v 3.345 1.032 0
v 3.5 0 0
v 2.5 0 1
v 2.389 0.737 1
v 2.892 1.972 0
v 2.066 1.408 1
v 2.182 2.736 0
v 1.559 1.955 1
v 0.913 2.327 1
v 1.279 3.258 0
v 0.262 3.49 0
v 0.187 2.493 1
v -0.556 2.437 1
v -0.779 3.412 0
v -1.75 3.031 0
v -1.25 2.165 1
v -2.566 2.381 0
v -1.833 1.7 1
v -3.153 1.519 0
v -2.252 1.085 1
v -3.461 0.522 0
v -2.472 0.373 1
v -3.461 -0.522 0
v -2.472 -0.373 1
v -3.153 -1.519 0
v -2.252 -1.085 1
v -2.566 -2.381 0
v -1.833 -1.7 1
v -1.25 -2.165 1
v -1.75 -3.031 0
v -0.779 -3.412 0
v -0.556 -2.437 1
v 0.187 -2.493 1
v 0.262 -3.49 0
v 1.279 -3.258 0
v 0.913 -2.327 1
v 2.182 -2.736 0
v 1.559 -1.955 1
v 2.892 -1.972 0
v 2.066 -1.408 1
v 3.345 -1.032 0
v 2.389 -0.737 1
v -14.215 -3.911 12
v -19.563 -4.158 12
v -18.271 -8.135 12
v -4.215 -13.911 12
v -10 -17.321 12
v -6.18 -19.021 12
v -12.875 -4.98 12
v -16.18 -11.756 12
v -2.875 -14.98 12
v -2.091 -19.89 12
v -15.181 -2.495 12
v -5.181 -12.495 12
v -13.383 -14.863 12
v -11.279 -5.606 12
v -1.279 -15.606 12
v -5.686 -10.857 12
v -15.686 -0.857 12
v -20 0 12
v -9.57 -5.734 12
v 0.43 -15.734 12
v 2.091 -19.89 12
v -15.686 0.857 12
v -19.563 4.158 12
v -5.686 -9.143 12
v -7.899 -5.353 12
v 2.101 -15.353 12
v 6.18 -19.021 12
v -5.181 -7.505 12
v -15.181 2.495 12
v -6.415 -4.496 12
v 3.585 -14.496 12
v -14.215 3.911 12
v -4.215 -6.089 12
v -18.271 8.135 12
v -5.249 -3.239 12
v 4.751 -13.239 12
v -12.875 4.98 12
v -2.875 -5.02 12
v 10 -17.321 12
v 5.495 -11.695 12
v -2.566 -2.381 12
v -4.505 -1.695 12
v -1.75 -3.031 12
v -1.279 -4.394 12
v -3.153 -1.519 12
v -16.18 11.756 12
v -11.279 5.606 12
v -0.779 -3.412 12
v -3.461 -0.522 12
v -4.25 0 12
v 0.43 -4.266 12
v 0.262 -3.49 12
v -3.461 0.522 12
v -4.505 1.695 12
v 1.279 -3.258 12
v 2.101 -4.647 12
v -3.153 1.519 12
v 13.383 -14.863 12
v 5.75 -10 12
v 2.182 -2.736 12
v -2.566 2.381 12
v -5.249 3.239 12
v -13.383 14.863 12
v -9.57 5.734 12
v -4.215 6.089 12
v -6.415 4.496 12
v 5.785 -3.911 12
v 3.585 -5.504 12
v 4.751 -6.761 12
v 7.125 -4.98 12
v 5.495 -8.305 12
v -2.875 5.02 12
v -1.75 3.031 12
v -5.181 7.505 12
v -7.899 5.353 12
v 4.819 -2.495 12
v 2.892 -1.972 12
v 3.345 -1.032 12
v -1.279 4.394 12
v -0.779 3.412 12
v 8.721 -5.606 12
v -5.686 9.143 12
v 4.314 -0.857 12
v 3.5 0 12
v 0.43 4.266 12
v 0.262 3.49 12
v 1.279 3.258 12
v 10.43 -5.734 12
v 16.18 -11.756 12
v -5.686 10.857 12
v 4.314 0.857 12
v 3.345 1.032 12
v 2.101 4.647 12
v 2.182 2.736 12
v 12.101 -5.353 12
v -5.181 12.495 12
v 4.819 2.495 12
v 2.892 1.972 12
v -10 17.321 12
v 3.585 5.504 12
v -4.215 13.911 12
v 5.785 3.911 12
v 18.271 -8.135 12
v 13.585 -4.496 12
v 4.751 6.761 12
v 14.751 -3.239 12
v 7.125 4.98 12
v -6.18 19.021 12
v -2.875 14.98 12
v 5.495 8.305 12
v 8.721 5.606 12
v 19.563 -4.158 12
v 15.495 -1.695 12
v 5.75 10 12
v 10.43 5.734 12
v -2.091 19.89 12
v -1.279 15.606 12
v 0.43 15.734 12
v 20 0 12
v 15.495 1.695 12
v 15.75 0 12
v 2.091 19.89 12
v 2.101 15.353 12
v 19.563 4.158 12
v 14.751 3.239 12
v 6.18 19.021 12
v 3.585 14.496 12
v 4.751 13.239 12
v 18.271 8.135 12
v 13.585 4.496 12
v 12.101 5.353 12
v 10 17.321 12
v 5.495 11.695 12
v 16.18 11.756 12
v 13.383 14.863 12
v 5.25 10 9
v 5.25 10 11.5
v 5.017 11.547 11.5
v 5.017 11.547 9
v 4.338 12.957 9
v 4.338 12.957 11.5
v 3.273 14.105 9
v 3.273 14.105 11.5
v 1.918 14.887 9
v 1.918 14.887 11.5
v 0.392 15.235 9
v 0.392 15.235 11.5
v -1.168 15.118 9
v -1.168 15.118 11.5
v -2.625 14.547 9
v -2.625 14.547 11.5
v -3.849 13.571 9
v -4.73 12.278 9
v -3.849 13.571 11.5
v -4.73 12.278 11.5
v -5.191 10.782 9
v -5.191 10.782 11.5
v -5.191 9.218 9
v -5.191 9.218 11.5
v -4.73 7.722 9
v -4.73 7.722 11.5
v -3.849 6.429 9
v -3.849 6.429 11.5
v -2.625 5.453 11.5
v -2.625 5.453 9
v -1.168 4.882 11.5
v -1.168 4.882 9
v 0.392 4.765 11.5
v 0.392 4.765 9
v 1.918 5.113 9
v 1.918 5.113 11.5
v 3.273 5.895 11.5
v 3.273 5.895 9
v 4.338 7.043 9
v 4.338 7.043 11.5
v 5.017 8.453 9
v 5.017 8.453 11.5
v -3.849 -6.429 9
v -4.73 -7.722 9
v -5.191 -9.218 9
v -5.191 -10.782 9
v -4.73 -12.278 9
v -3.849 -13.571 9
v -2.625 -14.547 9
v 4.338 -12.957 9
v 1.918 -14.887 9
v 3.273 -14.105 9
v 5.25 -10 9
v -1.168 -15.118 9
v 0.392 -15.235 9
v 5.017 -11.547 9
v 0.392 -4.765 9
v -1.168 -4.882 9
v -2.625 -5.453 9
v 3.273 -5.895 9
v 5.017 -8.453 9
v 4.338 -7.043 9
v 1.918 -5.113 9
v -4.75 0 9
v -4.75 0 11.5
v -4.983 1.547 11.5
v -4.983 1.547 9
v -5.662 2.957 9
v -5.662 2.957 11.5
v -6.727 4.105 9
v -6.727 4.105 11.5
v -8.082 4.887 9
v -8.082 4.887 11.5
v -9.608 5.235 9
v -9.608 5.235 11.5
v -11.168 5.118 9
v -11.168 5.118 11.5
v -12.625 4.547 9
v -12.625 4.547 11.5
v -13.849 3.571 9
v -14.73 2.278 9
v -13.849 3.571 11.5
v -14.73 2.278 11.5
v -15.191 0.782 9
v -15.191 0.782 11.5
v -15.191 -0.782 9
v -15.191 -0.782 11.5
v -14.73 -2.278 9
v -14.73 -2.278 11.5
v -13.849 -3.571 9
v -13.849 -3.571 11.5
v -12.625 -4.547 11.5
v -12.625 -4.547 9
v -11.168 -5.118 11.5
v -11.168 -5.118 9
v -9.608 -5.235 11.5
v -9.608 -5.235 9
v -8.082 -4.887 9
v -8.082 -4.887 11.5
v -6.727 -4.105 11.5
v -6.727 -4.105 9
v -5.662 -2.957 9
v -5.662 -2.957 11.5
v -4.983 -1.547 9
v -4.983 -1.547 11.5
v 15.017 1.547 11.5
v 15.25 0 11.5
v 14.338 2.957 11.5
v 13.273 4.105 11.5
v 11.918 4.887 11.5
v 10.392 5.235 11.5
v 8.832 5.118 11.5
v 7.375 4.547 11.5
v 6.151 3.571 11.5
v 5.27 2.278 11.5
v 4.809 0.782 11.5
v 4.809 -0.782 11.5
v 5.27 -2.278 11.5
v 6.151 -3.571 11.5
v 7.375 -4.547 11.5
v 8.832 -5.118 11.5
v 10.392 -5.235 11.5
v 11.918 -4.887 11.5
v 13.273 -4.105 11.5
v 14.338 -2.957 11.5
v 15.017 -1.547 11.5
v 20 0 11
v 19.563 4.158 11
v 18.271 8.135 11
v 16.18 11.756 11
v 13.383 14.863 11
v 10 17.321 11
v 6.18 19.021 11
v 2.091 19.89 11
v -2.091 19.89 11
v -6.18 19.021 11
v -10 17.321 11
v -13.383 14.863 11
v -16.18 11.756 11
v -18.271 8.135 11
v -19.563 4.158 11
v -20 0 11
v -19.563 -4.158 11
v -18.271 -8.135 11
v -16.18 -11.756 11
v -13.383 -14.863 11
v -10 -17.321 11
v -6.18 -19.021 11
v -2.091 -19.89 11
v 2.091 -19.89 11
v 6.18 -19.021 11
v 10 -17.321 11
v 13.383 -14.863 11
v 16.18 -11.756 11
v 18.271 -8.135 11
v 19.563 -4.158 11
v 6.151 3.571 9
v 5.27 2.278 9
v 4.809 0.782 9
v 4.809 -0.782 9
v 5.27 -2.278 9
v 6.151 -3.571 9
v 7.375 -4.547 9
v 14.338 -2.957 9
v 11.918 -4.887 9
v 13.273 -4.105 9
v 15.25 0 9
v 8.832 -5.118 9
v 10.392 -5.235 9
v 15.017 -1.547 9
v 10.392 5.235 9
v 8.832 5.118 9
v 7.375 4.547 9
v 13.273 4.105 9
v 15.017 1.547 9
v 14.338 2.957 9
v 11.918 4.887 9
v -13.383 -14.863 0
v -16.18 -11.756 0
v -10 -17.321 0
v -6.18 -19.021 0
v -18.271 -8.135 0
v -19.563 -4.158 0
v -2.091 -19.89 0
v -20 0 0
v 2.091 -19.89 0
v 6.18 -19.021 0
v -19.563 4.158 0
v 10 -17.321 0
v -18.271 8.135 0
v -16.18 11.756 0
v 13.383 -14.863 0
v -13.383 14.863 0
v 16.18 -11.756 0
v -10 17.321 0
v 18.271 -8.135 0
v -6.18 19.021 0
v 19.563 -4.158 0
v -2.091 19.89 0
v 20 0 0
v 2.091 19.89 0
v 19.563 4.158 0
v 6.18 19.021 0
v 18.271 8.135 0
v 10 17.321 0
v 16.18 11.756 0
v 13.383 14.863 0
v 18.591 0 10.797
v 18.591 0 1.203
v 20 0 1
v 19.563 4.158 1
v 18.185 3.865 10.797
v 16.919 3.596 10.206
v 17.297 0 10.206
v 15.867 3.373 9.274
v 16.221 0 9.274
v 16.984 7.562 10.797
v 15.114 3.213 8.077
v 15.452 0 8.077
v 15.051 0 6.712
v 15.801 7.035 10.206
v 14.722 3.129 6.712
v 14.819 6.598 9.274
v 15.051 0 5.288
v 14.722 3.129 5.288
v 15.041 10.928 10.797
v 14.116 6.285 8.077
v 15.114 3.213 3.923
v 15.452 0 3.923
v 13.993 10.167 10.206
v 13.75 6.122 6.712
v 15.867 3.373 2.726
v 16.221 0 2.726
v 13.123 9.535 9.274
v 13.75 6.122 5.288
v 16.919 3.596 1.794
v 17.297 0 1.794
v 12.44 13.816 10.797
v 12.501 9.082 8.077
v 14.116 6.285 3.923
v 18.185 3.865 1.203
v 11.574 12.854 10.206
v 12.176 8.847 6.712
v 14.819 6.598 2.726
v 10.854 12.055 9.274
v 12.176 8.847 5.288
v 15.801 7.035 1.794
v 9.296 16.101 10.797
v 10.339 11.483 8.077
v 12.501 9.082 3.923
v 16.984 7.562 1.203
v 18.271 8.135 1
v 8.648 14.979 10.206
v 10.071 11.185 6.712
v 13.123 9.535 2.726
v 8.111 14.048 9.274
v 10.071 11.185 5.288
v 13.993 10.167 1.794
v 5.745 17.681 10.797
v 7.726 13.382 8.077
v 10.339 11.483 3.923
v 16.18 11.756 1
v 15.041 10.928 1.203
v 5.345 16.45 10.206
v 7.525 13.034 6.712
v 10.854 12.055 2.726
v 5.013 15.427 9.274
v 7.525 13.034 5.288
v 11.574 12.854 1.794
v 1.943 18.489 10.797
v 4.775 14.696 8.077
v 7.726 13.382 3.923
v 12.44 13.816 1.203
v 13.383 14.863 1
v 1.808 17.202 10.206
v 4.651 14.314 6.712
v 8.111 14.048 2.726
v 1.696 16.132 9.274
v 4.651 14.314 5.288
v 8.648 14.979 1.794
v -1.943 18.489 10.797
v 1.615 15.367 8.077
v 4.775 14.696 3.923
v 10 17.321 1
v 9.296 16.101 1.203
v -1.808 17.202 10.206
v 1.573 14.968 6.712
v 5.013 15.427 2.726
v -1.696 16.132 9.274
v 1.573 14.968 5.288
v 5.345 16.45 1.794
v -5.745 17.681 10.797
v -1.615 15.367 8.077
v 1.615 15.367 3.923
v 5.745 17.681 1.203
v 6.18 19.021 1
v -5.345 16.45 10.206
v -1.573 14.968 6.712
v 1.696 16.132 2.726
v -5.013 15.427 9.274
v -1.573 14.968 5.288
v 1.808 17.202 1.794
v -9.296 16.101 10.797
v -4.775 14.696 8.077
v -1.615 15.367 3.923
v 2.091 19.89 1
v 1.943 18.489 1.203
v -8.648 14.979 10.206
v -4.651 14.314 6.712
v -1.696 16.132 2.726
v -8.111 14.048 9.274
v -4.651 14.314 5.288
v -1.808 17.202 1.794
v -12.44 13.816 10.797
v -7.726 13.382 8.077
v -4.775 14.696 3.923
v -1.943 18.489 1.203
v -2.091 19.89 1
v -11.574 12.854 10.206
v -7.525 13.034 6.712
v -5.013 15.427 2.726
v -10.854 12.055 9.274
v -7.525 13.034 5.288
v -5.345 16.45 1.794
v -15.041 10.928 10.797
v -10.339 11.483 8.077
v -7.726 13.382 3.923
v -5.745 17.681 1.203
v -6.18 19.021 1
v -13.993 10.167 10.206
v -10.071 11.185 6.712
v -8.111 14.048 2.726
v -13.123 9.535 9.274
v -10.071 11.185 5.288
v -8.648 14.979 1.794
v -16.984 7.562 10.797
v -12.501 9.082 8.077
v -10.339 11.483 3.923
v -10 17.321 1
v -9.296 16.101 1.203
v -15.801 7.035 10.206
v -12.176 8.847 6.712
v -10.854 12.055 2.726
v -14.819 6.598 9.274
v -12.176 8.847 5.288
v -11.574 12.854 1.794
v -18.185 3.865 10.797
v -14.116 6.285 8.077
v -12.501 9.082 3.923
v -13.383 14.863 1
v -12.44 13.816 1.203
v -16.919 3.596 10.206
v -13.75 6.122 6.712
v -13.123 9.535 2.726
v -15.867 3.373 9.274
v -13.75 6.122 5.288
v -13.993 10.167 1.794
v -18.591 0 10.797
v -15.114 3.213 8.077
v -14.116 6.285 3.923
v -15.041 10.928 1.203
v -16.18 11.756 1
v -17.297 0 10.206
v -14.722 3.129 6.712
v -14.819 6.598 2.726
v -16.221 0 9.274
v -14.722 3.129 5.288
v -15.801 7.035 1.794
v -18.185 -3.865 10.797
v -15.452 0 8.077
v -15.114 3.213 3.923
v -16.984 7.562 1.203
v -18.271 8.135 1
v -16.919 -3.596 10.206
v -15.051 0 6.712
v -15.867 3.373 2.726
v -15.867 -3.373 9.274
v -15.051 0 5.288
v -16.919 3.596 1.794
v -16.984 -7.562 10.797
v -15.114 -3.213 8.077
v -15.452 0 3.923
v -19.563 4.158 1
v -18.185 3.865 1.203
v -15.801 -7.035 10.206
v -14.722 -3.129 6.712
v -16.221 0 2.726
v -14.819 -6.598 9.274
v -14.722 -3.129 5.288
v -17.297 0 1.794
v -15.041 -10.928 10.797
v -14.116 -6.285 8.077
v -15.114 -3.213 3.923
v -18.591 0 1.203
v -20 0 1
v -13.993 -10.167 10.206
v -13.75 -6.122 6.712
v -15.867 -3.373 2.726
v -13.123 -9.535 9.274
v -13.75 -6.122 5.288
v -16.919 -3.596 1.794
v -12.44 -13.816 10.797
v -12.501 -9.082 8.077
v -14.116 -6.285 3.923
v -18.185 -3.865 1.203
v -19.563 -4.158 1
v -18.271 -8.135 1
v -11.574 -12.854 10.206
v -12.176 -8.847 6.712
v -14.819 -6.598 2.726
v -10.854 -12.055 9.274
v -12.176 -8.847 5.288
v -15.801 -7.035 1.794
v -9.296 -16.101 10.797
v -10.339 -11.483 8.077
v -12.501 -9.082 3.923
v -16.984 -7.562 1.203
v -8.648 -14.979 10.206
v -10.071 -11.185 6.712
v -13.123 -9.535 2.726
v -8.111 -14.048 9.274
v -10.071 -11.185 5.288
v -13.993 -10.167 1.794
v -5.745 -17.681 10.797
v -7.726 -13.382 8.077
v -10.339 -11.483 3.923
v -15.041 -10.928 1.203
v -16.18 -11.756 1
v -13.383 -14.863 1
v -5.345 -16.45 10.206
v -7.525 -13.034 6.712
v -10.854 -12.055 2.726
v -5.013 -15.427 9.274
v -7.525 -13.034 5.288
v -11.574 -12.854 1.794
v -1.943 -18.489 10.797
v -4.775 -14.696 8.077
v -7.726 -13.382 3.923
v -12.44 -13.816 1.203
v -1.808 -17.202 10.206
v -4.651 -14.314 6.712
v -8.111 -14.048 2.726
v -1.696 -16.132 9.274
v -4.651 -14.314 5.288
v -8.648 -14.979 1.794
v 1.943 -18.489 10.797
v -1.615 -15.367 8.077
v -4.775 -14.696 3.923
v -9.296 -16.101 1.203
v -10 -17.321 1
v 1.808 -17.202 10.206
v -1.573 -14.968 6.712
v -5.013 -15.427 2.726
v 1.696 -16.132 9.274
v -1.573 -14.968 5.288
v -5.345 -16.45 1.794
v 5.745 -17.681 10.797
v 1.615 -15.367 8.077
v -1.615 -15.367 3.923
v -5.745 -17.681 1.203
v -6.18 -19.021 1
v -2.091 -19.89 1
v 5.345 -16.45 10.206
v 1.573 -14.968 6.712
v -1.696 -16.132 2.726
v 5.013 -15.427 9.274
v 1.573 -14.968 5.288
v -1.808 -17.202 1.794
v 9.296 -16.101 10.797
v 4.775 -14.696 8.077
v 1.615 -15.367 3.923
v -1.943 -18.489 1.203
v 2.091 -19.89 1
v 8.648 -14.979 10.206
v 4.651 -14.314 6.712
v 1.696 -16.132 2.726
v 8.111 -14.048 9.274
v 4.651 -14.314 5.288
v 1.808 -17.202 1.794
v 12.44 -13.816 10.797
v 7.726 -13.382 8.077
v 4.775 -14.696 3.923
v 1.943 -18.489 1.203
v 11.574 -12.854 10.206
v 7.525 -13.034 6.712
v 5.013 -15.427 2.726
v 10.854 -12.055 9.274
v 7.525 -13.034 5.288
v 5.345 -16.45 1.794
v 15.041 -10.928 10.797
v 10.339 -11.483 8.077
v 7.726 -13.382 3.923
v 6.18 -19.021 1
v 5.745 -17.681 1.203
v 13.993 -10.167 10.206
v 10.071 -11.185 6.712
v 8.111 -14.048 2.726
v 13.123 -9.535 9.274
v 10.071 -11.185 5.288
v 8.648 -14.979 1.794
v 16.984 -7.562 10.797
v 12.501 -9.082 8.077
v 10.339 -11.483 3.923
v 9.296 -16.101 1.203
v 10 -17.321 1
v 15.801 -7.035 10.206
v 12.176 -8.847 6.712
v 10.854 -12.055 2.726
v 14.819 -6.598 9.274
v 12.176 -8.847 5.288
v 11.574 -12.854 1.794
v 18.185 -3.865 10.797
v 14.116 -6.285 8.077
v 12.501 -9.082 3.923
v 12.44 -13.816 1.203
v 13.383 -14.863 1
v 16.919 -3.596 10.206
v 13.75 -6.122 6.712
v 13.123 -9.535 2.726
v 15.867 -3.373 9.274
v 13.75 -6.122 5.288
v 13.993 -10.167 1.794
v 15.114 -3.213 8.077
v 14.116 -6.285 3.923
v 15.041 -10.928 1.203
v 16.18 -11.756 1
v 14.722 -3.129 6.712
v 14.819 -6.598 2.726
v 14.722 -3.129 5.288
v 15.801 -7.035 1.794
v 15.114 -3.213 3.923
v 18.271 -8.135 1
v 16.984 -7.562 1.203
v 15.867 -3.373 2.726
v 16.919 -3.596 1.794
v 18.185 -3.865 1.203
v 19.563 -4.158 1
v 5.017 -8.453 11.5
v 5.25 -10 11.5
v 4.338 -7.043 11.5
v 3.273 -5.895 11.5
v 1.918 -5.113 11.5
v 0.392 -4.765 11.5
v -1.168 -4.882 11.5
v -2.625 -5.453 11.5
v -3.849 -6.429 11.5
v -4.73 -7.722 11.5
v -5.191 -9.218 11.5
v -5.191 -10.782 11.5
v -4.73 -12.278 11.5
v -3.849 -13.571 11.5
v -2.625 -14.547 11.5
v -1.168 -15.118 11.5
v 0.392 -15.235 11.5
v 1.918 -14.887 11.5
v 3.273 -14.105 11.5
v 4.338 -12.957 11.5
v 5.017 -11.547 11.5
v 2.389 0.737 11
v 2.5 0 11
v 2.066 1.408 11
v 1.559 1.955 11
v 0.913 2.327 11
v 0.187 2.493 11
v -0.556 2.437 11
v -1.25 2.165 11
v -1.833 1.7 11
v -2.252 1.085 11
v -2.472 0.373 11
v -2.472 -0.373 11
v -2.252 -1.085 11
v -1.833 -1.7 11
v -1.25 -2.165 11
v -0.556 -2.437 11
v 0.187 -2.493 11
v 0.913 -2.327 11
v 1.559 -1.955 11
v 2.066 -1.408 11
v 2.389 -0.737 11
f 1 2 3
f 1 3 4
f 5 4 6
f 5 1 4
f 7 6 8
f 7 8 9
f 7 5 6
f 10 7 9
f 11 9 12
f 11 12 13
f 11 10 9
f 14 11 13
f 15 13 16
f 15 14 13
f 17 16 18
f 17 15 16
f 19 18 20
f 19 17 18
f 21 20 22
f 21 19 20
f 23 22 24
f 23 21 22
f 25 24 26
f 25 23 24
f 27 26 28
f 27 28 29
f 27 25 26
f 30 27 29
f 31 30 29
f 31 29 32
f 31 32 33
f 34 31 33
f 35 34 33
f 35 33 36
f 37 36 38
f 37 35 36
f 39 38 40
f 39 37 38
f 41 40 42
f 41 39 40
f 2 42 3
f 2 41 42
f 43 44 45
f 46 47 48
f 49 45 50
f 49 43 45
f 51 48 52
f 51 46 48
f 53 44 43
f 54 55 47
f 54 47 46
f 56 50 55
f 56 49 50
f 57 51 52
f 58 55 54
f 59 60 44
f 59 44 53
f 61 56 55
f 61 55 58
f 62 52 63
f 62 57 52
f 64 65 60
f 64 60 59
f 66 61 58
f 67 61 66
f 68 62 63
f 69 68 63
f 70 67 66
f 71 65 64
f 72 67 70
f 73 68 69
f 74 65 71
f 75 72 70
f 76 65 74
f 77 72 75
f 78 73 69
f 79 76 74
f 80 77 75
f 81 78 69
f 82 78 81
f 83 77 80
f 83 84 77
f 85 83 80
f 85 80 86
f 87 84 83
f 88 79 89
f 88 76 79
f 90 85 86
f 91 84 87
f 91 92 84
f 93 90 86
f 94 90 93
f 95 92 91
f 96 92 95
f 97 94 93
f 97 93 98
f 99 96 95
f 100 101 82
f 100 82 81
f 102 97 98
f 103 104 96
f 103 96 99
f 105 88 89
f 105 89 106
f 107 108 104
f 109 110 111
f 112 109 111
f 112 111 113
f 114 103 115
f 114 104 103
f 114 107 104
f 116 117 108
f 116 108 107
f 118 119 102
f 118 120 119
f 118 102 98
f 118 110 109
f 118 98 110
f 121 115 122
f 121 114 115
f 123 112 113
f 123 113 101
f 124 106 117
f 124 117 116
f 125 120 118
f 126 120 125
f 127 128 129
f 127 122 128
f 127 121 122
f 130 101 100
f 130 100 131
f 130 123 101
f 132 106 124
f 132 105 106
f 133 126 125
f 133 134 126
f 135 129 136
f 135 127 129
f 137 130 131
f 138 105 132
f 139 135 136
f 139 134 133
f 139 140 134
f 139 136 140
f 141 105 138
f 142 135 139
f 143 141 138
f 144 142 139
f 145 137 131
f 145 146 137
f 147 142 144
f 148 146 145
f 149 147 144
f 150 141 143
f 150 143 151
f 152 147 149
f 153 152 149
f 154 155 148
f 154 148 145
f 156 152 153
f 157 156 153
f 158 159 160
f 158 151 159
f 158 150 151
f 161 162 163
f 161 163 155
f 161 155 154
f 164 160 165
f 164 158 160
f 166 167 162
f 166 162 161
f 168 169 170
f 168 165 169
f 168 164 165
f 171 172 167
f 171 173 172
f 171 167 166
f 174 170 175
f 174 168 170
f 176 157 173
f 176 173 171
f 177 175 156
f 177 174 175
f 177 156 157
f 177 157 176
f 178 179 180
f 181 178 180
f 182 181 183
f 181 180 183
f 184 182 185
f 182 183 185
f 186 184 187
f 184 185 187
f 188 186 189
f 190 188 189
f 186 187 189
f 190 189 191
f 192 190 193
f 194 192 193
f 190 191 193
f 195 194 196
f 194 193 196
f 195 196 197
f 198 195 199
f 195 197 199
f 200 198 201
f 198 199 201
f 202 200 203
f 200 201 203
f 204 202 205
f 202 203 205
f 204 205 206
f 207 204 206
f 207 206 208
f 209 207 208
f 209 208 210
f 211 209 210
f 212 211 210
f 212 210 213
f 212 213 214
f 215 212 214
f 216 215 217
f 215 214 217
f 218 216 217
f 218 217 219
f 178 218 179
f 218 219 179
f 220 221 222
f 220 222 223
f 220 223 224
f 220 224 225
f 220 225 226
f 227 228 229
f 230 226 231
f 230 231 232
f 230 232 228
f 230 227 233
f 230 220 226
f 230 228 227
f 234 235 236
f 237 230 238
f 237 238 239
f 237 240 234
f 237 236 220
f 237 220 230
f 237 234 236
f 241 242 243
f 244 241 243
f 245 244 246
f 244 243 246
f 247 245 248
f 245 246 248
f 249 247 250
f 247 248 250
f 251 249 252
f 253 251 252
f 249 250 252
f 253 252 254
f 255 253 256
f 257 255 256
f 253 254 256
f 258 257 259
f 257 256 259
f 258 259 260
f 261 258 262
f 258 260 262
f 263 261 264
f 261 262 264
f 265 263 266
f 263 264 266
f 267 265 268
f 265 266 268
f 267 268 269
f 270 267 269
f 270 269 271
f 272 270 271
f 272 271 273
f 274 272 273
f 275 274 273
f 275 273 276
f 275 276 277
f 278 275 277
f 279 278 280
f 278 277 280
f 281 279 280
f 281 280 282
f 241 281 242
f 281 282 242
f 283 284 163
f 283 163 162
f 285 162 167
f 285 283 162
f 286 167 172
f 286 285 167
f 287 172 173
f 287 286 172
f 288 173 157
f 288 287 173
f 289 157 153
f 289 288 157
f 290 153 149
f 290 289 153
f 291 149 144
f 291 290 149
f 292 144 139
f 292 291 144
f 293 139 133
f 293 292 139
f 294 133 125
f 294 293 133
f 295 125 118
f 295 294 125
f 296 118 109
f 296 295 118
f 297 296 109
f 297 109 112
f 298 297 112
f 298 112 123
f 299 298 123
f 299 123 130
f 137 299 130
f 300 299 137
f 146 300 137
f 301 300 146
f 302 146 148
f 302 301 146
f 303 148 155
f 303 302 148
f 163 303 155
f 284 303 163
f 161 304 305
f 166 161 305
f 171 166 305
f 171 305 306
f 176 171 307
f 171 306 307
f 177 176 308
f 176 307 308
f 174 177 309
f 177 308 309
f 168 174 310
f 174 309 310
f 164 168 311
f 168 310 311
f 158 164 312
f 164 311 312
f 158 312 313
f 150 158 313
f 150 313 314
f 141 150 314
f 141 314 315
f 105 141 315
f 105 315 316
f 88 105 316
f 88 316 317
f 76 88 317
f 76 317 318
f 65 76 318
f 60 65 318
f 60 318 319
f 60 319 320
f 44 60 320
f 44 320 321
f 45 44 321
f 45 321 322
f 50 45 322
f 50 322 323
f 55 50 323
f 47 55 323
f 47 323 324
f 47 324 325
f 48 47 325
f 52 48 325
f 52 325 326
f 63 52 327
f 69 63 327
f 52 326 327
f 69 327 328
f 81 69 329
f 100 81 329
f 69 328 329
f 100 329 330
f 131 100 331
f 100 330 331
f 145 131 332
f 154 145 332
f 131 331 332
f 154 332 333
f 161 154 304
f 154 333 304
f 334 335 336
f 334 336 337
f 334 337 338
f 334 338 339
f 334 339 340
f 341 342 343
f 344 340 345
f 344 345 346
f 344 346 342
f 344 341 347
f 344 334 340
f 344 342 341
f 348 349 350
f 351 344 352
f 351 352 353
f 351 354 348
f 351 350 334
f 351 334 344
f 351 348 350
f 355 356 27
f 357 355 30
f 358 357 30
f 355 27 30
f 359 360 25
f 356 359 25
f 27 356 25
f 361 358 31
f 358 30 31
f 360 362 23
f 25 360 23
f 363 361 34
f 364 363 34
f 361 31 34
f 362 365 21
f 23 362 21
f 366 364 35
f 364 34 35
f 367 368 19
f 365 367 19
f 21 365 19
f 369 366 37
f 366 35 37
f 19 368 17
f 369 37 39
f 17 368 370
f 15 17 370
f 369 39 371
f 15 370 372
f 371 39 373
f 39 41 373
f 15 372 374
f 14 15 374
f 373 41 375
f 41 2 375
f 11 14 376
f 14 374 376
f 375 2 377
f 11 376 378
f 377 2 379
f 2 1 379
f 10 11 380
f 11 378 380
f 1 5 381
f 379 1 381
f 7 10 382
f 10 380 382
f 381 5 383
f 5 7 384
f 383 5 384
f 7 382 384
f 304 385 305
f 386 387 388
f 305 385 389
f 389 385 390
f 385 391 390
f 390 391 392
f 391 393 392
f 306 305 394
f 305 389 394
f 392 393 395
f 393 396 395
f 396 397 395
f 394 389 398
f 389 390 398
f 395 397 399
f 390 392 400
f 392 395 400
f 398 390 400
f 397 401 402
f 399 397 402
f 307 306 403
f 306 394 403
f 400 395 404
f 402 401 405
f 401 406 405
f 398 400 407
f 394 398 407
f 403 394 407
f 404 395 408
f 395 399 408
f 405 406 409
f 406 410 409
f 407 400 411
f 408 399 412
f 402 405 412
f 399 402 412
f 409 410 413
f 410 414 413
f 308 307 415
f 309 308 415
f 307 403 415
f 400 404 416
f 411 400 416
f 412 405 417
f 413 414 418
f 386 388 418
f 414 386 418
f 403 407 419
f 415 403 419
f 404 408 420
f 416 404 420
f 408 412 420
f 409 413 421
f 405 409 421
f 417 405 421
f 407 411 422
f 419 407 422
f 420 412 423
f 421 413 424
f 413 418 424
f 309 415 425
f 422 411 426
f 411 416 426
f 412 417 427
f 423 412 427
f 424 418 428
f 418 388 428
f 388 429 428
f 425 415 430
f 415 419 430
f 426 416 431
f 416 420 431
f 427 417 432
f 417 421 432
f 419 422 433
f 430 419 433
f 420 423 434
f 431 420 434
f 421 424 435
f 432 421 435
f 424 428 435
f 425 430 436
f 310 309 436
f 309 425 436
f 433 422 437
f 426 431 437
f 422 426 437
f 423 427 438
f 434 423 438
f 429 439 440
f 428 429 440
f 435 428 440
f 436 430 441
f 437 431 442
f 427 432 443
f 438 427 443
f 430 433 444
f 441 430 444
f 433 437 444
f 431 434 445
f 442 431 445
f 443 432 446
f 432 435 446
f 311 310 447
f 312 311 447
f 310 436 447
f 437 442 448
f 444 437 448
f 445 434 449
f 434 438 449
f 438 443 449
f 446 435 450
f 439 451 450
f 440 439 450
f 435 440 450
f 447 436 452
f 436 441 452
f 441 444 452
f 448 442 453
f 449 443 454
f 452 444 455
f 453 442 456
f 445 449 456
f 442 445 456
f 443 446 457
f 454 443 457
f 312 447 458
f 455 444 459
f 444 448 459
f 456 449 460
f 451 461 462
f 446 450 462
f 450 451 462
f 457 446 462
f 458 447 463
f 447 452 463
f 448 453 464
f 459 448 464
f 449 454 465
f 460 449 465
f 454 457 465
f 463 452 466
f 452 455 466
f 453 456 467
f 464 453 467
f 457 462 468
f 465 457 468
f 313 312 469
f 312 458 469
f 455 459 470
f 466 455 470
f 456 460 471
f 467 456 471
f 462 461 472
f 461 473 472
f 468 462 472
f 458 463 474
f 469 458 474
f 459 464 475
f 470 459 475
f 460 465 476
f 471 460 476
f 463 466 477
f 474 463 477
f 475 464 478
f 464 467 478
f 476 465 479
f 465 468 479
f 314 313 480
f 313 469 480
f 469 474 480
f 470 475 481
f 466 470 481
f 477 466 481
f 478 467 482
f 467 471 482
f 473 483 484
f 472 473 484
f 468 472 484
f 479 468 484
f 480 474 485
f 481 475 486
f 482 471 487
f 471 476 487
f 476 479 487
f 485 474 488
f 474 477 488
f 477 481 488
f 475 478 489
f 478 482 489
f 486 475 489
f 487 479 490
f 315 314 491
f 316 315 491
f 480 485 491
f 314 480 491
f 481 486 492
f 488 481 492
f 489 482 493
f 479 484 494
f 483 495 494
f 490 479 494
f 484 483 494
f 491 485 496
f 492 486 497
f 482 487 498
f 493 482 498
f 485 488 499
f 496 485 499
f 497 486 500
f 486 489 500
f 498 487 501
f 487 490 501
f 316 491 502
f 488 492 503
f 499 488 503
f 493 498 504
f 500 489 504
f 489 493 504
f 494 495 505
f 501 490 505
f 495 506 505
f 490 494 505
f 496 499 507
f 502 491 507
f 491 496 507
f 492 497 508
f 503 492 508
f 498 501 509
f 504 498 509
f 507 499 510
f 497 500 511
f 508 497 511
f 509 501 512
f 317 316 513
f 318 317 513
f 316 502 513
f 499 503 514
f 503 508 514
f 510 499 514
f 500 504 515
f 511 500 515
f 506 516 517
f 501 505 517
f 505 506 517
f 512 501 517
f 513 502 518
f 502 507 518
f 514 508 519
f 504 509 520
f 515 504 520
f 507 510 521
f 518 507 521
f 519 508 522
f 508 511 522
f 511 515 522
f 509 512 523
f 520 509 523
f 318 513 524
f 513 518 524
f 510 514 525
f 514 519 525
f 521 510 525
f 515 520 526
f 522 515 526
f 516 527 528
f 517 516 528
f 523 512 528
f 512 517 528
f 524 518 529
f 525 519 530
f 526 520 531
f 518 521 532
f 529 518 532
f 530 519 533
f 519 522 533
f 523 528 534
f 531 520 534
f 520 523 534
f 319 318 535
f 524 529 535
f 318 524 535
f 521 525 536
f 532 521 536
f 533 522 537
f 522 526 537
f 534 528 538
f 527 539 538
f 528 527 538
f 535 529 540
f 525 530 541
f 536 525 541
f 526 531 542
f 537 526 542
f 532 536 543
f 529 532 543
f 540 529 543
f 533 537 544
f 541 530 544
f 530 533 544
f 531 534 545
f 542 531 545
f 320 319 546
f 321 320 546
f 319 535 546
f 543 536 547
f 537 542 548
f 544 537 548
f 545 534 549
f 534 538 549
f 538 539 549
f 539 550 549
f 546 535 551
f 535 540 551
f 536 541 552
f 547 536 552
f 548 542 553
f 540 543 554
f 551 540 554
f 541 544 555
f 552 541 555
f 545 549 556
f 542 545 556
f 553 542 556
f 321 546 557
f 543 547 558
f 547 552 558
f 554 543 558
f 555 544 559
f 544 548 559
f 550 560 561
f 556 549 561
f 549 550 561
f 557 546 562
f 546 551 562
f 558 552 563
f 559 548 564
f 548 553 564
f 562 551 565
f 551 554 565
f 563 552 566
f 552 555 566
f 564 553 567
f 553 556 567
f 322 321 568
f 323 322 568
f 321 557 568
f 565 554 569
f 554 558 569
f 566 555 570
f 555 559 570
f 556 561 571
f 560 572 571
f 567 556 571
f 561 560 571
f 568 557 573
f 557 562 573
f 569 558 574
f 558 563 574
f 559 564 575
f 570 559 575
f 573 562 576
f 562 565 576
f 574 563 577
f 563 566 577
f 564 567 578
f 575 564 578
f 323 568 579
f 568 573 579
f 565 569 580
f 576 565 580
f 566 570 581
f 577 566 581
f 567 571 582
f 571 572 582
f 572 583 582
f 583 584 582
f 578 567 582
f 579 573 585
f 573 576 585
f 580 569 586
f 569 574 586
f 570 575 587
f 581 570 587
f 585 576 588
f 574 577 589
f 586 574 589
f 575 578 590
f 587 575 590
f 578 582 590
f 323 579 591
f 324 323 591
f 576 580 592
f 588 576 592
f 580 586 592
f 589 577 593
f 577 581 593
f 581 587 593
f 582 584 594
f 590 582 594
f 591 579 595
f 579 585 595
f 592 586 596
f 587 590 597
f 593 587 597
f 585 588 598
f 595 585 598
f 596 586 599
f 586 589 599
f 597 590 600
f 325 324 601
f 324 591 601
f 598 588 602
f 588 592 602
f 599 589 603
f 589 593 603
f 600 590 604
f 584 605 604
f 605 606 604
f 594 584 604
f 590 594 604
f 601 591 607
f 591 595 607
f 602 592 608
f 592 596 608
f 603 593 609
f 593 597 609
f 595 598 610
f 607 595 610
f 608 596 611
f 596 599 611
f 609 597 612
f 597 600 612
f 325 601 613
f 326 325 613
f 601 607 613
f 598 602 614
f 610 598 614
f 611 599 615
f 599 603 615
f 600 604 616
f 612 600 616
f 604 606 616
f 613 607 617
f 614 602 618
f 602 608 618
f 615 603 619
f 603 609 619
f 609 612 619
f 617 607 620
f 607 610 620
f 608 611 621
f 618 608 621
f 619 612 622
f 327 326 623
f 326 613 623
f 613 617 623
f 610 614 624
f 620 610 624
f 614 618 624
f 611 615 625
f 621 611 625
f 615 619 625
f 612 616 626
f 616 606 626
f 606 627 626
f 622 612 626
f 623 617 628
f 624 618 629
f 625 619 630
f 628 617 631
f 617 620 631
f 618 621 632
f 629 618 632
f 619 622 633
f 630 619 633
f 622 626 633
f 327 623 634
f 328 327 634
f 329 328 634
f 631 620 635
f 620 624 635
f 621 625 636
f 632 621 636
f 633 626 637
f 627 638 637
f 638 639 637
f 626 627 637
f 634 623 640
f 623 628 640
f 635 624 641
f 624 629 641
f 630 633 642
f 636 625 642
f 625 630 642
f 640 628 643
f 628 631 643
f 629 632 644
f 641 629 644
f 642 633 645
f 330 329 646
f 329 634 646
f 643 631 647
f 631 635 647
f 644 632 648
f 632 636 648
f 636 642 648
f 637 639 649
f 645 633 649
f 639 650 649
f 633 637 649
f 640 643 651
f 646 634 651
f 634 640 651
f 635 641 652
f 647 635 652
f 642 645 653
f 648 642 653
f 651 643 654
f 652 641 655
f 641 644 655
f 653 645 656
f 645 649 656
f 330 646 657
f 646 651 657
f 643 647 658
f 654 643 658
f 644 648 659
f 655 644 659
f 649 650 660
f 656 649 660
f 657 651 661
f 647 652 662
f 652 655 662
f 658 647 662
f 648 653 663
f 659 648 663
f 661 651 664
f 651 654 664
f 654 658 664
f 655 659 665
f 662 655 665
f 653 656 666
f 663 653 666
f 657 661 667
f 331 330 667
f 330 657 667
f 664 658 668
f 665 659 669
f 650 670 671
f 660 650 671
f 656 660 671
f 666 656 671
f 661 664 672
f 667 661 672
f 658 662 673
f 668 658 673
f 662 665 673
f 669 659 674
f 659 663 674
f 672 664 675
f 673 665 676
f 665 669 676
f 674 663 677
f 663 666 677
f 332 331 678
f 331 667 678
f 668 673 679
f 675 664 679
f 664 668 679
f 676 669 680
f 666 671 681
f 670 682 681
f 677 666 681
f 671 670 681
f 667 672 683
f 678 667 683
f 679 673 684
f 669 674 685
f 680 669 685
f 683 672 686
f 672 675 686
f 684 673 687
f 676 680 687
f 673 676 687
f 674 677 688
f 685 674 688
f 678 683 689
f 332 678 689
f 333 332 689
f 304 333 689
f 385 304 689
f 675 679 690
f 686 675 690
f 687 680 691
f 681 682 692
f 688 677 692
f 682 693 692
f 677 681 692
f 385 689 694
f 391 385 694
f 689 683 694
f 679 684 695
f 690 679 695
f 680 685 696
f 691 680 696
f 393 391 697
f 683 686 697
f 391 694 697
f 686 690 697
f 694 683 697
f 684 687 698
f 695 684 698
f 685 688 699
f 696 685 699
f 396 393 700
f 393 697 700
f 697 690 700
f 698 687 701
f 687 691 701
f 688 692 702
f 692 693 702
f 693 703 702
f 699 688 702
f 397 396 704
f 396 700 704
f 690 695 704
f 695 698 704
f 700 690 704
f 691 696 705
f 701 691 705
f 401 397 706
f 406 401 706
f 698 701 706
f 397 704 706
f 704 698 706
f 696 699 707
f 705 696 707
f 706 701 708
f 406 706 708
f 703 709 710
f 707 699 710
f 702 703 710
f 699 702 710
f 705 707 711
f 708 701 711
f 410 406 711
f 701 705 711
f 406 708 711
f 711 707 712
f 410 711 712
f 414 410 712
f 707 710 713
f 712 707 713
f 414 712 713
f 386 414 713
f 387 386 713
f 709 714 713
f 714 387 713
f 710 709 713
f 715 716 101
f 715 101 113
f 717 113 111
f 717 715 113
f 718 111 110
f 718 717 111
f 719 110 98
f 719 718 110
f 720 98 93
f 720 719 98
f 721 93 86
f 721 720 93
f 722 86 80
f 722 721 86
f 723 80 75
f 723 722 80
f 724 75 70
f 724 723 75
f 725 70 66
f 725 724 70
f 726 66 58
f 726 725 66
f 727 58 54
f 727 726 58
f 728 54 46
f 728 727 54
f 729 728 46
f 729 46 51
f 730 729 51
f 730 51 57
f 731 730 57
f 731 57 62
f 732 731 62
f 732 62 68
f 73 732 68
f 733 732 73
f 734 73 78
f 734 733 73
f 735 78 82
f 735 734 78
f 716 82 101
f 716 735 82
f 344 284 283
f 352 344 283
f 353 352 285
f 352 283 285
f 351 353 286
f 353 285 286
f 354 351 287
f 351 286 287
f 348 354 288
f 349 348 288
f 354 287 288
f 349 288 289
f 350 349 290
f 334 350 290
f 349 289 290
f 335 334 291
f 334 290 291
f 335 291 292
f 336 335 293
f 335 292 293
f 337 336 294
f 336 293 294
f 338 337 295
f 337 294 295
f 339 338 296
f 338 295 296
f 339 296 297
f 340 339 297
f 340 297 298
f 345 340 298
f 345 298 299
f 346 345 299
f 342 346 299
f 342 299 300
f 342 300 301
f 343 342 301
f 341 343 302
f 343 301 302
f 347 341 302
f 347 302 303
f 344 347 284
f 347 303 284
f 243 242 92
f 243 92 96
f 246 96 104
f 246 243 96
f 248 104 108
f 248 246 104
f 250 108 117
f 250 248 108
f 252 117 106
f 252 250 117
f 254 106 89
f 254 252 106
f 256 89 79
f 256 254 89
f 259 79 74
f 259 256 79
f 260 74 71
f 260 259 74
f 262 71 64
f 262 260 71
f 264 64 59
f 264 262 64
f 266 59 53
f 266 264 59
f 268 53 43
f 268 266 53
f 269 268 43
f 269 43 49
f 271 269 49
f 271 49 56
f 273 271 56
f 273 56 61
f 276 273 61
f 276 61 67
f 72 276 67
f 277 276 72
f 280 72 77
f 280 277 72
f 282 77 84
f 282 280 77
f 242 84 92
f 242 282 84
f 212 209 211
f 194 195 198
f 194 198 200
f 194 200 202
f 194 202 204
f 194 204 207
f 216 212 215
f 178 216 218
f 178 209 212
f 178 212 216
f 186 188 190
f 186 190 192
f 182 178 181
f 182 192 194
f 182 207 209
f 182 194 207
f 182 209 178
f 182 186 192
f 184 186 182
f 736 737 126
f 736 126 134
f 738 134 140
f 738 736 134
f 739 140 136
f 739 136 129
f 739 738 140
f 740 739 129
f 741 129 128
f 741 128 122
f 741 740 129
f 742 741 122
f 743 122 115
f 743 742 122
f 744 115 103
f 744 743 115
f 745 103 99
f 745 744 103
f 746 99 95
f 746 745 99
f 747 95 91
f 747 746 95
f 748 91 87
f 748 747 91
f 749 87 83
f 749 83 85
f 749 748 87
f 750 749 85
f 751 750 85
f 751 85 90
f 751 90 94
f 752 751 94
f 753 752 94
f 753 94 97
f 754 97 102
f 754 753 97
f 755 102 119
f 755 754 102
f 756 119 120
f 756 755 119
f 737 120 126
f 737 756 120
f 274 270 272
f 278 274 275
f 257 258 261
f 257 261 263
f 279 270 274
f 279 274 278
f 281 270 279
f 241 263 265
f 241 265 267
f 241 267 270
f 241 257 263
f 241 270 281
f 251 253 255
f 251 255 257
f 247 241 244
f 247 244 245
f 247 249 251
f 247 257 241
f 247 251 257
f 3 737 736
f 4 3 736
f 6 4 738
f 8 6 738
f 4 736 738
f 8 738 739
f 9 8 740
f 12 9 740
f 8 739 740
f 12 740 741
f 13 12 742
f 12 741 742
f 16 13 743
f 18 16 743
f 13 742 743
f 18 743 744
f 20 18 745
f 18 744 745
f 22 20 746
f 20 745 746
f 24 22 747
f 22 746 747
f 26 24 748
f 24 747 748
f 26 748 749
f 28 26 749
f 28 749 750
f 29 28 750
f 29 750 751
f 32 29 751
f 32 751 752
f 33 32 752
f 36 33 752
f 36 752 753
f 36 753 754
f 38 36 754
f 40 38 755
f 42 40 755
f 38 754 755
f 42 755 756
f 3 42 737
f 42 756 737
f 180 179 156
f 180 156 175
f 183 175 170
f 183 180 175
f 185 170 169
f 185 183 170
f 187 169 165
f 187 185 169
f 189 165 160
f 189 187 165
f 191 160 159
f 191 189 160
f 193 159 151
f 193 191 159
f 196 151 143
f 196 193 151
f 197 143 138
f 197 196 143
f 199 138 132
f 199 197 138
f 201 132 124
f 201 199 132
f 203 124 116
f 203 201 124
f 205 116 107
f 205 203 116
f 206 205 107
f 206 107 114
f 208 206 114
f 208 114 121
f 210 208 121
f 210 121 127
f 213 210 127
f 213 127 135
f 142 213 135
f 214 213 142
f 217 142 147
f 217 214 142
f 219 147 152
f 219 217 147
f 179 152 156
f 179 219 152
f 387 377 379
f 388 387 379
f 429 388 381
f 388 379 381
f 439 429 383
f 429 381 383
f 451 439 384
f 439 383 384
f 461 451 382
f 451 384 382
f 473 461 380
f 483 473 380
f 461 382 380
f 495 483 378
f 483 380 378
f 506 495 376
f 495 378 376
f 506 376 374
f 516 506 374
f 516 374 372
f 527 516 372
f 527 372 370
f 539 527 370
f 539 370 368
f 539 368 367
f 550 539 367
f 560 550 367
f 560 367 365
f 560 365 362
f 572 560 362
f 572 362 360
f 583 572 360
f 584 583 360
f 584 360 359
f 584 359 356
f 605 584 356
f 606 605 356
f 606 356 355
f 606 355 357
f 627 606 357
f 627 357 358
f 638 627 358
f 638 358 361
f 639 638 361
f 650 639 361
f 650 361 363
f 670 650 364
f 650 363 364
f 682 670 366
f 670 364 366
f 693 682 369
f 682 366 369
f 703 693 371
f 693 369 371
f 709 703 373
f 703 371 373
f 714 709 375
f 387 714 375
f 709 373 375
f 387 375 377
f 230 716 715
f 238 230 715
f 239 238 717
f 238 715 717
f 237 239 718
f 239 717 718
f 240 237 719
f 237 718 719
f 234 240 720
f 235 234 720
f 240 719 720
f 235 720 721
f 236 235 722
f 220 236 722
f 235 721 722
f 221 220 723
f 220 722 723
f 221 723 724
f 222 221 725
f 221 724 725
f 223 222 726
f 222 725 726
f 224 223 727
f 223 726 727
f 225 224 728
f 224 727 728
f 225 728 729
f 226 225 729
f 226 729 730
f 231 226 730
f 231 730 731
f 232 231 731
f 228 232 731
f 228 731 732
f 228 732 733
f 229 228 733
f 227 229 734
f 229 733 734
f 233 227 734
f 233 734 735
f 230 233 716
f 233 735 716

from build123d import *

# Parameters (mm, degrees)
TORUS_R         = 5
SKETCH_R        = 20
PAD_DEPTH       = 12
SKETCH001_R     = 2.5
POCKET_DEPTH    = 12
SKETCH002_R     = 5.25
POCKET001_DEPTH = 3
CHAMFER_SIZE    = 0.5
CHAMFER001_SIZE = 1


with BuildPart() as torus:
    # Torus → Torus (revolve)
    with BuildSketch(Plane(origin=(0, 0, 6), x_dir=(1, 0, 0), z_dir=(0, -1, 0))):
        with Locations((20, 0)):
            Circle(TORUS_R)
    revolve(axis=Axis((0, 0, 6), (0, 0, 1)))


with BuildPart() as cut:
    # Sketch → Pad (new body)
    with BuildSketch(Plane.XY):
        Circle(SKETCH_R)
    extrude(amount=PAD_DEPTH)

    # Sketch001 (on Face3 of Pad) → Pocket (cut)
    with BuildSketch(Plane.XY.offset(12)):
        Circle(SKETCH001_R)
    extrude(amount=-POCKET_DEPTH, mode=Mode.SUBTRACT)

    # Sketch002 (on Face3 of Pocket) → Pocket001 (cut)
    with BuildSketch(Plane.XY.offset(12)):
        with Locations((-10, 0)):
            Circle(SKETCH002_R)
        with Locations((10, 0)):
            Circle(SKETCH002_R)
        with Locations((0, 10)):
            Circle(SKETCH002_R)
        with Locations((0, -10)):
            Circle(SKETCH002_R)
    extrude(amount=-POCKET001_DEPTH, mode=Mode.SUBTRACT)

    # Chamfer
    chamfer_edges = [cut.edges().sort_by_distance(p)[0] for p in [
        (-5.25, 10, 12),
        (-15.25, 0, 12),
        (-5.25, -10, 12),
        (4.75, 0, 12),
    ]]
    chamfer(chamfer_edges, length=CHAMFER_SIZE)

    # Chamfer001
    chamfer001_edges = [cut.edges().sort_by_distance(p)[0] for p in [
        (-2.5, 0, 12),
        (-2.5, 0, 0),
    ]]
    chamfer(chamfer001_edges, length=CHAMFER001_SIZE)

    # Cut: cut Torus
    add(torus.part, mode=Mode.SUBTRACT)


solid = cut.part
